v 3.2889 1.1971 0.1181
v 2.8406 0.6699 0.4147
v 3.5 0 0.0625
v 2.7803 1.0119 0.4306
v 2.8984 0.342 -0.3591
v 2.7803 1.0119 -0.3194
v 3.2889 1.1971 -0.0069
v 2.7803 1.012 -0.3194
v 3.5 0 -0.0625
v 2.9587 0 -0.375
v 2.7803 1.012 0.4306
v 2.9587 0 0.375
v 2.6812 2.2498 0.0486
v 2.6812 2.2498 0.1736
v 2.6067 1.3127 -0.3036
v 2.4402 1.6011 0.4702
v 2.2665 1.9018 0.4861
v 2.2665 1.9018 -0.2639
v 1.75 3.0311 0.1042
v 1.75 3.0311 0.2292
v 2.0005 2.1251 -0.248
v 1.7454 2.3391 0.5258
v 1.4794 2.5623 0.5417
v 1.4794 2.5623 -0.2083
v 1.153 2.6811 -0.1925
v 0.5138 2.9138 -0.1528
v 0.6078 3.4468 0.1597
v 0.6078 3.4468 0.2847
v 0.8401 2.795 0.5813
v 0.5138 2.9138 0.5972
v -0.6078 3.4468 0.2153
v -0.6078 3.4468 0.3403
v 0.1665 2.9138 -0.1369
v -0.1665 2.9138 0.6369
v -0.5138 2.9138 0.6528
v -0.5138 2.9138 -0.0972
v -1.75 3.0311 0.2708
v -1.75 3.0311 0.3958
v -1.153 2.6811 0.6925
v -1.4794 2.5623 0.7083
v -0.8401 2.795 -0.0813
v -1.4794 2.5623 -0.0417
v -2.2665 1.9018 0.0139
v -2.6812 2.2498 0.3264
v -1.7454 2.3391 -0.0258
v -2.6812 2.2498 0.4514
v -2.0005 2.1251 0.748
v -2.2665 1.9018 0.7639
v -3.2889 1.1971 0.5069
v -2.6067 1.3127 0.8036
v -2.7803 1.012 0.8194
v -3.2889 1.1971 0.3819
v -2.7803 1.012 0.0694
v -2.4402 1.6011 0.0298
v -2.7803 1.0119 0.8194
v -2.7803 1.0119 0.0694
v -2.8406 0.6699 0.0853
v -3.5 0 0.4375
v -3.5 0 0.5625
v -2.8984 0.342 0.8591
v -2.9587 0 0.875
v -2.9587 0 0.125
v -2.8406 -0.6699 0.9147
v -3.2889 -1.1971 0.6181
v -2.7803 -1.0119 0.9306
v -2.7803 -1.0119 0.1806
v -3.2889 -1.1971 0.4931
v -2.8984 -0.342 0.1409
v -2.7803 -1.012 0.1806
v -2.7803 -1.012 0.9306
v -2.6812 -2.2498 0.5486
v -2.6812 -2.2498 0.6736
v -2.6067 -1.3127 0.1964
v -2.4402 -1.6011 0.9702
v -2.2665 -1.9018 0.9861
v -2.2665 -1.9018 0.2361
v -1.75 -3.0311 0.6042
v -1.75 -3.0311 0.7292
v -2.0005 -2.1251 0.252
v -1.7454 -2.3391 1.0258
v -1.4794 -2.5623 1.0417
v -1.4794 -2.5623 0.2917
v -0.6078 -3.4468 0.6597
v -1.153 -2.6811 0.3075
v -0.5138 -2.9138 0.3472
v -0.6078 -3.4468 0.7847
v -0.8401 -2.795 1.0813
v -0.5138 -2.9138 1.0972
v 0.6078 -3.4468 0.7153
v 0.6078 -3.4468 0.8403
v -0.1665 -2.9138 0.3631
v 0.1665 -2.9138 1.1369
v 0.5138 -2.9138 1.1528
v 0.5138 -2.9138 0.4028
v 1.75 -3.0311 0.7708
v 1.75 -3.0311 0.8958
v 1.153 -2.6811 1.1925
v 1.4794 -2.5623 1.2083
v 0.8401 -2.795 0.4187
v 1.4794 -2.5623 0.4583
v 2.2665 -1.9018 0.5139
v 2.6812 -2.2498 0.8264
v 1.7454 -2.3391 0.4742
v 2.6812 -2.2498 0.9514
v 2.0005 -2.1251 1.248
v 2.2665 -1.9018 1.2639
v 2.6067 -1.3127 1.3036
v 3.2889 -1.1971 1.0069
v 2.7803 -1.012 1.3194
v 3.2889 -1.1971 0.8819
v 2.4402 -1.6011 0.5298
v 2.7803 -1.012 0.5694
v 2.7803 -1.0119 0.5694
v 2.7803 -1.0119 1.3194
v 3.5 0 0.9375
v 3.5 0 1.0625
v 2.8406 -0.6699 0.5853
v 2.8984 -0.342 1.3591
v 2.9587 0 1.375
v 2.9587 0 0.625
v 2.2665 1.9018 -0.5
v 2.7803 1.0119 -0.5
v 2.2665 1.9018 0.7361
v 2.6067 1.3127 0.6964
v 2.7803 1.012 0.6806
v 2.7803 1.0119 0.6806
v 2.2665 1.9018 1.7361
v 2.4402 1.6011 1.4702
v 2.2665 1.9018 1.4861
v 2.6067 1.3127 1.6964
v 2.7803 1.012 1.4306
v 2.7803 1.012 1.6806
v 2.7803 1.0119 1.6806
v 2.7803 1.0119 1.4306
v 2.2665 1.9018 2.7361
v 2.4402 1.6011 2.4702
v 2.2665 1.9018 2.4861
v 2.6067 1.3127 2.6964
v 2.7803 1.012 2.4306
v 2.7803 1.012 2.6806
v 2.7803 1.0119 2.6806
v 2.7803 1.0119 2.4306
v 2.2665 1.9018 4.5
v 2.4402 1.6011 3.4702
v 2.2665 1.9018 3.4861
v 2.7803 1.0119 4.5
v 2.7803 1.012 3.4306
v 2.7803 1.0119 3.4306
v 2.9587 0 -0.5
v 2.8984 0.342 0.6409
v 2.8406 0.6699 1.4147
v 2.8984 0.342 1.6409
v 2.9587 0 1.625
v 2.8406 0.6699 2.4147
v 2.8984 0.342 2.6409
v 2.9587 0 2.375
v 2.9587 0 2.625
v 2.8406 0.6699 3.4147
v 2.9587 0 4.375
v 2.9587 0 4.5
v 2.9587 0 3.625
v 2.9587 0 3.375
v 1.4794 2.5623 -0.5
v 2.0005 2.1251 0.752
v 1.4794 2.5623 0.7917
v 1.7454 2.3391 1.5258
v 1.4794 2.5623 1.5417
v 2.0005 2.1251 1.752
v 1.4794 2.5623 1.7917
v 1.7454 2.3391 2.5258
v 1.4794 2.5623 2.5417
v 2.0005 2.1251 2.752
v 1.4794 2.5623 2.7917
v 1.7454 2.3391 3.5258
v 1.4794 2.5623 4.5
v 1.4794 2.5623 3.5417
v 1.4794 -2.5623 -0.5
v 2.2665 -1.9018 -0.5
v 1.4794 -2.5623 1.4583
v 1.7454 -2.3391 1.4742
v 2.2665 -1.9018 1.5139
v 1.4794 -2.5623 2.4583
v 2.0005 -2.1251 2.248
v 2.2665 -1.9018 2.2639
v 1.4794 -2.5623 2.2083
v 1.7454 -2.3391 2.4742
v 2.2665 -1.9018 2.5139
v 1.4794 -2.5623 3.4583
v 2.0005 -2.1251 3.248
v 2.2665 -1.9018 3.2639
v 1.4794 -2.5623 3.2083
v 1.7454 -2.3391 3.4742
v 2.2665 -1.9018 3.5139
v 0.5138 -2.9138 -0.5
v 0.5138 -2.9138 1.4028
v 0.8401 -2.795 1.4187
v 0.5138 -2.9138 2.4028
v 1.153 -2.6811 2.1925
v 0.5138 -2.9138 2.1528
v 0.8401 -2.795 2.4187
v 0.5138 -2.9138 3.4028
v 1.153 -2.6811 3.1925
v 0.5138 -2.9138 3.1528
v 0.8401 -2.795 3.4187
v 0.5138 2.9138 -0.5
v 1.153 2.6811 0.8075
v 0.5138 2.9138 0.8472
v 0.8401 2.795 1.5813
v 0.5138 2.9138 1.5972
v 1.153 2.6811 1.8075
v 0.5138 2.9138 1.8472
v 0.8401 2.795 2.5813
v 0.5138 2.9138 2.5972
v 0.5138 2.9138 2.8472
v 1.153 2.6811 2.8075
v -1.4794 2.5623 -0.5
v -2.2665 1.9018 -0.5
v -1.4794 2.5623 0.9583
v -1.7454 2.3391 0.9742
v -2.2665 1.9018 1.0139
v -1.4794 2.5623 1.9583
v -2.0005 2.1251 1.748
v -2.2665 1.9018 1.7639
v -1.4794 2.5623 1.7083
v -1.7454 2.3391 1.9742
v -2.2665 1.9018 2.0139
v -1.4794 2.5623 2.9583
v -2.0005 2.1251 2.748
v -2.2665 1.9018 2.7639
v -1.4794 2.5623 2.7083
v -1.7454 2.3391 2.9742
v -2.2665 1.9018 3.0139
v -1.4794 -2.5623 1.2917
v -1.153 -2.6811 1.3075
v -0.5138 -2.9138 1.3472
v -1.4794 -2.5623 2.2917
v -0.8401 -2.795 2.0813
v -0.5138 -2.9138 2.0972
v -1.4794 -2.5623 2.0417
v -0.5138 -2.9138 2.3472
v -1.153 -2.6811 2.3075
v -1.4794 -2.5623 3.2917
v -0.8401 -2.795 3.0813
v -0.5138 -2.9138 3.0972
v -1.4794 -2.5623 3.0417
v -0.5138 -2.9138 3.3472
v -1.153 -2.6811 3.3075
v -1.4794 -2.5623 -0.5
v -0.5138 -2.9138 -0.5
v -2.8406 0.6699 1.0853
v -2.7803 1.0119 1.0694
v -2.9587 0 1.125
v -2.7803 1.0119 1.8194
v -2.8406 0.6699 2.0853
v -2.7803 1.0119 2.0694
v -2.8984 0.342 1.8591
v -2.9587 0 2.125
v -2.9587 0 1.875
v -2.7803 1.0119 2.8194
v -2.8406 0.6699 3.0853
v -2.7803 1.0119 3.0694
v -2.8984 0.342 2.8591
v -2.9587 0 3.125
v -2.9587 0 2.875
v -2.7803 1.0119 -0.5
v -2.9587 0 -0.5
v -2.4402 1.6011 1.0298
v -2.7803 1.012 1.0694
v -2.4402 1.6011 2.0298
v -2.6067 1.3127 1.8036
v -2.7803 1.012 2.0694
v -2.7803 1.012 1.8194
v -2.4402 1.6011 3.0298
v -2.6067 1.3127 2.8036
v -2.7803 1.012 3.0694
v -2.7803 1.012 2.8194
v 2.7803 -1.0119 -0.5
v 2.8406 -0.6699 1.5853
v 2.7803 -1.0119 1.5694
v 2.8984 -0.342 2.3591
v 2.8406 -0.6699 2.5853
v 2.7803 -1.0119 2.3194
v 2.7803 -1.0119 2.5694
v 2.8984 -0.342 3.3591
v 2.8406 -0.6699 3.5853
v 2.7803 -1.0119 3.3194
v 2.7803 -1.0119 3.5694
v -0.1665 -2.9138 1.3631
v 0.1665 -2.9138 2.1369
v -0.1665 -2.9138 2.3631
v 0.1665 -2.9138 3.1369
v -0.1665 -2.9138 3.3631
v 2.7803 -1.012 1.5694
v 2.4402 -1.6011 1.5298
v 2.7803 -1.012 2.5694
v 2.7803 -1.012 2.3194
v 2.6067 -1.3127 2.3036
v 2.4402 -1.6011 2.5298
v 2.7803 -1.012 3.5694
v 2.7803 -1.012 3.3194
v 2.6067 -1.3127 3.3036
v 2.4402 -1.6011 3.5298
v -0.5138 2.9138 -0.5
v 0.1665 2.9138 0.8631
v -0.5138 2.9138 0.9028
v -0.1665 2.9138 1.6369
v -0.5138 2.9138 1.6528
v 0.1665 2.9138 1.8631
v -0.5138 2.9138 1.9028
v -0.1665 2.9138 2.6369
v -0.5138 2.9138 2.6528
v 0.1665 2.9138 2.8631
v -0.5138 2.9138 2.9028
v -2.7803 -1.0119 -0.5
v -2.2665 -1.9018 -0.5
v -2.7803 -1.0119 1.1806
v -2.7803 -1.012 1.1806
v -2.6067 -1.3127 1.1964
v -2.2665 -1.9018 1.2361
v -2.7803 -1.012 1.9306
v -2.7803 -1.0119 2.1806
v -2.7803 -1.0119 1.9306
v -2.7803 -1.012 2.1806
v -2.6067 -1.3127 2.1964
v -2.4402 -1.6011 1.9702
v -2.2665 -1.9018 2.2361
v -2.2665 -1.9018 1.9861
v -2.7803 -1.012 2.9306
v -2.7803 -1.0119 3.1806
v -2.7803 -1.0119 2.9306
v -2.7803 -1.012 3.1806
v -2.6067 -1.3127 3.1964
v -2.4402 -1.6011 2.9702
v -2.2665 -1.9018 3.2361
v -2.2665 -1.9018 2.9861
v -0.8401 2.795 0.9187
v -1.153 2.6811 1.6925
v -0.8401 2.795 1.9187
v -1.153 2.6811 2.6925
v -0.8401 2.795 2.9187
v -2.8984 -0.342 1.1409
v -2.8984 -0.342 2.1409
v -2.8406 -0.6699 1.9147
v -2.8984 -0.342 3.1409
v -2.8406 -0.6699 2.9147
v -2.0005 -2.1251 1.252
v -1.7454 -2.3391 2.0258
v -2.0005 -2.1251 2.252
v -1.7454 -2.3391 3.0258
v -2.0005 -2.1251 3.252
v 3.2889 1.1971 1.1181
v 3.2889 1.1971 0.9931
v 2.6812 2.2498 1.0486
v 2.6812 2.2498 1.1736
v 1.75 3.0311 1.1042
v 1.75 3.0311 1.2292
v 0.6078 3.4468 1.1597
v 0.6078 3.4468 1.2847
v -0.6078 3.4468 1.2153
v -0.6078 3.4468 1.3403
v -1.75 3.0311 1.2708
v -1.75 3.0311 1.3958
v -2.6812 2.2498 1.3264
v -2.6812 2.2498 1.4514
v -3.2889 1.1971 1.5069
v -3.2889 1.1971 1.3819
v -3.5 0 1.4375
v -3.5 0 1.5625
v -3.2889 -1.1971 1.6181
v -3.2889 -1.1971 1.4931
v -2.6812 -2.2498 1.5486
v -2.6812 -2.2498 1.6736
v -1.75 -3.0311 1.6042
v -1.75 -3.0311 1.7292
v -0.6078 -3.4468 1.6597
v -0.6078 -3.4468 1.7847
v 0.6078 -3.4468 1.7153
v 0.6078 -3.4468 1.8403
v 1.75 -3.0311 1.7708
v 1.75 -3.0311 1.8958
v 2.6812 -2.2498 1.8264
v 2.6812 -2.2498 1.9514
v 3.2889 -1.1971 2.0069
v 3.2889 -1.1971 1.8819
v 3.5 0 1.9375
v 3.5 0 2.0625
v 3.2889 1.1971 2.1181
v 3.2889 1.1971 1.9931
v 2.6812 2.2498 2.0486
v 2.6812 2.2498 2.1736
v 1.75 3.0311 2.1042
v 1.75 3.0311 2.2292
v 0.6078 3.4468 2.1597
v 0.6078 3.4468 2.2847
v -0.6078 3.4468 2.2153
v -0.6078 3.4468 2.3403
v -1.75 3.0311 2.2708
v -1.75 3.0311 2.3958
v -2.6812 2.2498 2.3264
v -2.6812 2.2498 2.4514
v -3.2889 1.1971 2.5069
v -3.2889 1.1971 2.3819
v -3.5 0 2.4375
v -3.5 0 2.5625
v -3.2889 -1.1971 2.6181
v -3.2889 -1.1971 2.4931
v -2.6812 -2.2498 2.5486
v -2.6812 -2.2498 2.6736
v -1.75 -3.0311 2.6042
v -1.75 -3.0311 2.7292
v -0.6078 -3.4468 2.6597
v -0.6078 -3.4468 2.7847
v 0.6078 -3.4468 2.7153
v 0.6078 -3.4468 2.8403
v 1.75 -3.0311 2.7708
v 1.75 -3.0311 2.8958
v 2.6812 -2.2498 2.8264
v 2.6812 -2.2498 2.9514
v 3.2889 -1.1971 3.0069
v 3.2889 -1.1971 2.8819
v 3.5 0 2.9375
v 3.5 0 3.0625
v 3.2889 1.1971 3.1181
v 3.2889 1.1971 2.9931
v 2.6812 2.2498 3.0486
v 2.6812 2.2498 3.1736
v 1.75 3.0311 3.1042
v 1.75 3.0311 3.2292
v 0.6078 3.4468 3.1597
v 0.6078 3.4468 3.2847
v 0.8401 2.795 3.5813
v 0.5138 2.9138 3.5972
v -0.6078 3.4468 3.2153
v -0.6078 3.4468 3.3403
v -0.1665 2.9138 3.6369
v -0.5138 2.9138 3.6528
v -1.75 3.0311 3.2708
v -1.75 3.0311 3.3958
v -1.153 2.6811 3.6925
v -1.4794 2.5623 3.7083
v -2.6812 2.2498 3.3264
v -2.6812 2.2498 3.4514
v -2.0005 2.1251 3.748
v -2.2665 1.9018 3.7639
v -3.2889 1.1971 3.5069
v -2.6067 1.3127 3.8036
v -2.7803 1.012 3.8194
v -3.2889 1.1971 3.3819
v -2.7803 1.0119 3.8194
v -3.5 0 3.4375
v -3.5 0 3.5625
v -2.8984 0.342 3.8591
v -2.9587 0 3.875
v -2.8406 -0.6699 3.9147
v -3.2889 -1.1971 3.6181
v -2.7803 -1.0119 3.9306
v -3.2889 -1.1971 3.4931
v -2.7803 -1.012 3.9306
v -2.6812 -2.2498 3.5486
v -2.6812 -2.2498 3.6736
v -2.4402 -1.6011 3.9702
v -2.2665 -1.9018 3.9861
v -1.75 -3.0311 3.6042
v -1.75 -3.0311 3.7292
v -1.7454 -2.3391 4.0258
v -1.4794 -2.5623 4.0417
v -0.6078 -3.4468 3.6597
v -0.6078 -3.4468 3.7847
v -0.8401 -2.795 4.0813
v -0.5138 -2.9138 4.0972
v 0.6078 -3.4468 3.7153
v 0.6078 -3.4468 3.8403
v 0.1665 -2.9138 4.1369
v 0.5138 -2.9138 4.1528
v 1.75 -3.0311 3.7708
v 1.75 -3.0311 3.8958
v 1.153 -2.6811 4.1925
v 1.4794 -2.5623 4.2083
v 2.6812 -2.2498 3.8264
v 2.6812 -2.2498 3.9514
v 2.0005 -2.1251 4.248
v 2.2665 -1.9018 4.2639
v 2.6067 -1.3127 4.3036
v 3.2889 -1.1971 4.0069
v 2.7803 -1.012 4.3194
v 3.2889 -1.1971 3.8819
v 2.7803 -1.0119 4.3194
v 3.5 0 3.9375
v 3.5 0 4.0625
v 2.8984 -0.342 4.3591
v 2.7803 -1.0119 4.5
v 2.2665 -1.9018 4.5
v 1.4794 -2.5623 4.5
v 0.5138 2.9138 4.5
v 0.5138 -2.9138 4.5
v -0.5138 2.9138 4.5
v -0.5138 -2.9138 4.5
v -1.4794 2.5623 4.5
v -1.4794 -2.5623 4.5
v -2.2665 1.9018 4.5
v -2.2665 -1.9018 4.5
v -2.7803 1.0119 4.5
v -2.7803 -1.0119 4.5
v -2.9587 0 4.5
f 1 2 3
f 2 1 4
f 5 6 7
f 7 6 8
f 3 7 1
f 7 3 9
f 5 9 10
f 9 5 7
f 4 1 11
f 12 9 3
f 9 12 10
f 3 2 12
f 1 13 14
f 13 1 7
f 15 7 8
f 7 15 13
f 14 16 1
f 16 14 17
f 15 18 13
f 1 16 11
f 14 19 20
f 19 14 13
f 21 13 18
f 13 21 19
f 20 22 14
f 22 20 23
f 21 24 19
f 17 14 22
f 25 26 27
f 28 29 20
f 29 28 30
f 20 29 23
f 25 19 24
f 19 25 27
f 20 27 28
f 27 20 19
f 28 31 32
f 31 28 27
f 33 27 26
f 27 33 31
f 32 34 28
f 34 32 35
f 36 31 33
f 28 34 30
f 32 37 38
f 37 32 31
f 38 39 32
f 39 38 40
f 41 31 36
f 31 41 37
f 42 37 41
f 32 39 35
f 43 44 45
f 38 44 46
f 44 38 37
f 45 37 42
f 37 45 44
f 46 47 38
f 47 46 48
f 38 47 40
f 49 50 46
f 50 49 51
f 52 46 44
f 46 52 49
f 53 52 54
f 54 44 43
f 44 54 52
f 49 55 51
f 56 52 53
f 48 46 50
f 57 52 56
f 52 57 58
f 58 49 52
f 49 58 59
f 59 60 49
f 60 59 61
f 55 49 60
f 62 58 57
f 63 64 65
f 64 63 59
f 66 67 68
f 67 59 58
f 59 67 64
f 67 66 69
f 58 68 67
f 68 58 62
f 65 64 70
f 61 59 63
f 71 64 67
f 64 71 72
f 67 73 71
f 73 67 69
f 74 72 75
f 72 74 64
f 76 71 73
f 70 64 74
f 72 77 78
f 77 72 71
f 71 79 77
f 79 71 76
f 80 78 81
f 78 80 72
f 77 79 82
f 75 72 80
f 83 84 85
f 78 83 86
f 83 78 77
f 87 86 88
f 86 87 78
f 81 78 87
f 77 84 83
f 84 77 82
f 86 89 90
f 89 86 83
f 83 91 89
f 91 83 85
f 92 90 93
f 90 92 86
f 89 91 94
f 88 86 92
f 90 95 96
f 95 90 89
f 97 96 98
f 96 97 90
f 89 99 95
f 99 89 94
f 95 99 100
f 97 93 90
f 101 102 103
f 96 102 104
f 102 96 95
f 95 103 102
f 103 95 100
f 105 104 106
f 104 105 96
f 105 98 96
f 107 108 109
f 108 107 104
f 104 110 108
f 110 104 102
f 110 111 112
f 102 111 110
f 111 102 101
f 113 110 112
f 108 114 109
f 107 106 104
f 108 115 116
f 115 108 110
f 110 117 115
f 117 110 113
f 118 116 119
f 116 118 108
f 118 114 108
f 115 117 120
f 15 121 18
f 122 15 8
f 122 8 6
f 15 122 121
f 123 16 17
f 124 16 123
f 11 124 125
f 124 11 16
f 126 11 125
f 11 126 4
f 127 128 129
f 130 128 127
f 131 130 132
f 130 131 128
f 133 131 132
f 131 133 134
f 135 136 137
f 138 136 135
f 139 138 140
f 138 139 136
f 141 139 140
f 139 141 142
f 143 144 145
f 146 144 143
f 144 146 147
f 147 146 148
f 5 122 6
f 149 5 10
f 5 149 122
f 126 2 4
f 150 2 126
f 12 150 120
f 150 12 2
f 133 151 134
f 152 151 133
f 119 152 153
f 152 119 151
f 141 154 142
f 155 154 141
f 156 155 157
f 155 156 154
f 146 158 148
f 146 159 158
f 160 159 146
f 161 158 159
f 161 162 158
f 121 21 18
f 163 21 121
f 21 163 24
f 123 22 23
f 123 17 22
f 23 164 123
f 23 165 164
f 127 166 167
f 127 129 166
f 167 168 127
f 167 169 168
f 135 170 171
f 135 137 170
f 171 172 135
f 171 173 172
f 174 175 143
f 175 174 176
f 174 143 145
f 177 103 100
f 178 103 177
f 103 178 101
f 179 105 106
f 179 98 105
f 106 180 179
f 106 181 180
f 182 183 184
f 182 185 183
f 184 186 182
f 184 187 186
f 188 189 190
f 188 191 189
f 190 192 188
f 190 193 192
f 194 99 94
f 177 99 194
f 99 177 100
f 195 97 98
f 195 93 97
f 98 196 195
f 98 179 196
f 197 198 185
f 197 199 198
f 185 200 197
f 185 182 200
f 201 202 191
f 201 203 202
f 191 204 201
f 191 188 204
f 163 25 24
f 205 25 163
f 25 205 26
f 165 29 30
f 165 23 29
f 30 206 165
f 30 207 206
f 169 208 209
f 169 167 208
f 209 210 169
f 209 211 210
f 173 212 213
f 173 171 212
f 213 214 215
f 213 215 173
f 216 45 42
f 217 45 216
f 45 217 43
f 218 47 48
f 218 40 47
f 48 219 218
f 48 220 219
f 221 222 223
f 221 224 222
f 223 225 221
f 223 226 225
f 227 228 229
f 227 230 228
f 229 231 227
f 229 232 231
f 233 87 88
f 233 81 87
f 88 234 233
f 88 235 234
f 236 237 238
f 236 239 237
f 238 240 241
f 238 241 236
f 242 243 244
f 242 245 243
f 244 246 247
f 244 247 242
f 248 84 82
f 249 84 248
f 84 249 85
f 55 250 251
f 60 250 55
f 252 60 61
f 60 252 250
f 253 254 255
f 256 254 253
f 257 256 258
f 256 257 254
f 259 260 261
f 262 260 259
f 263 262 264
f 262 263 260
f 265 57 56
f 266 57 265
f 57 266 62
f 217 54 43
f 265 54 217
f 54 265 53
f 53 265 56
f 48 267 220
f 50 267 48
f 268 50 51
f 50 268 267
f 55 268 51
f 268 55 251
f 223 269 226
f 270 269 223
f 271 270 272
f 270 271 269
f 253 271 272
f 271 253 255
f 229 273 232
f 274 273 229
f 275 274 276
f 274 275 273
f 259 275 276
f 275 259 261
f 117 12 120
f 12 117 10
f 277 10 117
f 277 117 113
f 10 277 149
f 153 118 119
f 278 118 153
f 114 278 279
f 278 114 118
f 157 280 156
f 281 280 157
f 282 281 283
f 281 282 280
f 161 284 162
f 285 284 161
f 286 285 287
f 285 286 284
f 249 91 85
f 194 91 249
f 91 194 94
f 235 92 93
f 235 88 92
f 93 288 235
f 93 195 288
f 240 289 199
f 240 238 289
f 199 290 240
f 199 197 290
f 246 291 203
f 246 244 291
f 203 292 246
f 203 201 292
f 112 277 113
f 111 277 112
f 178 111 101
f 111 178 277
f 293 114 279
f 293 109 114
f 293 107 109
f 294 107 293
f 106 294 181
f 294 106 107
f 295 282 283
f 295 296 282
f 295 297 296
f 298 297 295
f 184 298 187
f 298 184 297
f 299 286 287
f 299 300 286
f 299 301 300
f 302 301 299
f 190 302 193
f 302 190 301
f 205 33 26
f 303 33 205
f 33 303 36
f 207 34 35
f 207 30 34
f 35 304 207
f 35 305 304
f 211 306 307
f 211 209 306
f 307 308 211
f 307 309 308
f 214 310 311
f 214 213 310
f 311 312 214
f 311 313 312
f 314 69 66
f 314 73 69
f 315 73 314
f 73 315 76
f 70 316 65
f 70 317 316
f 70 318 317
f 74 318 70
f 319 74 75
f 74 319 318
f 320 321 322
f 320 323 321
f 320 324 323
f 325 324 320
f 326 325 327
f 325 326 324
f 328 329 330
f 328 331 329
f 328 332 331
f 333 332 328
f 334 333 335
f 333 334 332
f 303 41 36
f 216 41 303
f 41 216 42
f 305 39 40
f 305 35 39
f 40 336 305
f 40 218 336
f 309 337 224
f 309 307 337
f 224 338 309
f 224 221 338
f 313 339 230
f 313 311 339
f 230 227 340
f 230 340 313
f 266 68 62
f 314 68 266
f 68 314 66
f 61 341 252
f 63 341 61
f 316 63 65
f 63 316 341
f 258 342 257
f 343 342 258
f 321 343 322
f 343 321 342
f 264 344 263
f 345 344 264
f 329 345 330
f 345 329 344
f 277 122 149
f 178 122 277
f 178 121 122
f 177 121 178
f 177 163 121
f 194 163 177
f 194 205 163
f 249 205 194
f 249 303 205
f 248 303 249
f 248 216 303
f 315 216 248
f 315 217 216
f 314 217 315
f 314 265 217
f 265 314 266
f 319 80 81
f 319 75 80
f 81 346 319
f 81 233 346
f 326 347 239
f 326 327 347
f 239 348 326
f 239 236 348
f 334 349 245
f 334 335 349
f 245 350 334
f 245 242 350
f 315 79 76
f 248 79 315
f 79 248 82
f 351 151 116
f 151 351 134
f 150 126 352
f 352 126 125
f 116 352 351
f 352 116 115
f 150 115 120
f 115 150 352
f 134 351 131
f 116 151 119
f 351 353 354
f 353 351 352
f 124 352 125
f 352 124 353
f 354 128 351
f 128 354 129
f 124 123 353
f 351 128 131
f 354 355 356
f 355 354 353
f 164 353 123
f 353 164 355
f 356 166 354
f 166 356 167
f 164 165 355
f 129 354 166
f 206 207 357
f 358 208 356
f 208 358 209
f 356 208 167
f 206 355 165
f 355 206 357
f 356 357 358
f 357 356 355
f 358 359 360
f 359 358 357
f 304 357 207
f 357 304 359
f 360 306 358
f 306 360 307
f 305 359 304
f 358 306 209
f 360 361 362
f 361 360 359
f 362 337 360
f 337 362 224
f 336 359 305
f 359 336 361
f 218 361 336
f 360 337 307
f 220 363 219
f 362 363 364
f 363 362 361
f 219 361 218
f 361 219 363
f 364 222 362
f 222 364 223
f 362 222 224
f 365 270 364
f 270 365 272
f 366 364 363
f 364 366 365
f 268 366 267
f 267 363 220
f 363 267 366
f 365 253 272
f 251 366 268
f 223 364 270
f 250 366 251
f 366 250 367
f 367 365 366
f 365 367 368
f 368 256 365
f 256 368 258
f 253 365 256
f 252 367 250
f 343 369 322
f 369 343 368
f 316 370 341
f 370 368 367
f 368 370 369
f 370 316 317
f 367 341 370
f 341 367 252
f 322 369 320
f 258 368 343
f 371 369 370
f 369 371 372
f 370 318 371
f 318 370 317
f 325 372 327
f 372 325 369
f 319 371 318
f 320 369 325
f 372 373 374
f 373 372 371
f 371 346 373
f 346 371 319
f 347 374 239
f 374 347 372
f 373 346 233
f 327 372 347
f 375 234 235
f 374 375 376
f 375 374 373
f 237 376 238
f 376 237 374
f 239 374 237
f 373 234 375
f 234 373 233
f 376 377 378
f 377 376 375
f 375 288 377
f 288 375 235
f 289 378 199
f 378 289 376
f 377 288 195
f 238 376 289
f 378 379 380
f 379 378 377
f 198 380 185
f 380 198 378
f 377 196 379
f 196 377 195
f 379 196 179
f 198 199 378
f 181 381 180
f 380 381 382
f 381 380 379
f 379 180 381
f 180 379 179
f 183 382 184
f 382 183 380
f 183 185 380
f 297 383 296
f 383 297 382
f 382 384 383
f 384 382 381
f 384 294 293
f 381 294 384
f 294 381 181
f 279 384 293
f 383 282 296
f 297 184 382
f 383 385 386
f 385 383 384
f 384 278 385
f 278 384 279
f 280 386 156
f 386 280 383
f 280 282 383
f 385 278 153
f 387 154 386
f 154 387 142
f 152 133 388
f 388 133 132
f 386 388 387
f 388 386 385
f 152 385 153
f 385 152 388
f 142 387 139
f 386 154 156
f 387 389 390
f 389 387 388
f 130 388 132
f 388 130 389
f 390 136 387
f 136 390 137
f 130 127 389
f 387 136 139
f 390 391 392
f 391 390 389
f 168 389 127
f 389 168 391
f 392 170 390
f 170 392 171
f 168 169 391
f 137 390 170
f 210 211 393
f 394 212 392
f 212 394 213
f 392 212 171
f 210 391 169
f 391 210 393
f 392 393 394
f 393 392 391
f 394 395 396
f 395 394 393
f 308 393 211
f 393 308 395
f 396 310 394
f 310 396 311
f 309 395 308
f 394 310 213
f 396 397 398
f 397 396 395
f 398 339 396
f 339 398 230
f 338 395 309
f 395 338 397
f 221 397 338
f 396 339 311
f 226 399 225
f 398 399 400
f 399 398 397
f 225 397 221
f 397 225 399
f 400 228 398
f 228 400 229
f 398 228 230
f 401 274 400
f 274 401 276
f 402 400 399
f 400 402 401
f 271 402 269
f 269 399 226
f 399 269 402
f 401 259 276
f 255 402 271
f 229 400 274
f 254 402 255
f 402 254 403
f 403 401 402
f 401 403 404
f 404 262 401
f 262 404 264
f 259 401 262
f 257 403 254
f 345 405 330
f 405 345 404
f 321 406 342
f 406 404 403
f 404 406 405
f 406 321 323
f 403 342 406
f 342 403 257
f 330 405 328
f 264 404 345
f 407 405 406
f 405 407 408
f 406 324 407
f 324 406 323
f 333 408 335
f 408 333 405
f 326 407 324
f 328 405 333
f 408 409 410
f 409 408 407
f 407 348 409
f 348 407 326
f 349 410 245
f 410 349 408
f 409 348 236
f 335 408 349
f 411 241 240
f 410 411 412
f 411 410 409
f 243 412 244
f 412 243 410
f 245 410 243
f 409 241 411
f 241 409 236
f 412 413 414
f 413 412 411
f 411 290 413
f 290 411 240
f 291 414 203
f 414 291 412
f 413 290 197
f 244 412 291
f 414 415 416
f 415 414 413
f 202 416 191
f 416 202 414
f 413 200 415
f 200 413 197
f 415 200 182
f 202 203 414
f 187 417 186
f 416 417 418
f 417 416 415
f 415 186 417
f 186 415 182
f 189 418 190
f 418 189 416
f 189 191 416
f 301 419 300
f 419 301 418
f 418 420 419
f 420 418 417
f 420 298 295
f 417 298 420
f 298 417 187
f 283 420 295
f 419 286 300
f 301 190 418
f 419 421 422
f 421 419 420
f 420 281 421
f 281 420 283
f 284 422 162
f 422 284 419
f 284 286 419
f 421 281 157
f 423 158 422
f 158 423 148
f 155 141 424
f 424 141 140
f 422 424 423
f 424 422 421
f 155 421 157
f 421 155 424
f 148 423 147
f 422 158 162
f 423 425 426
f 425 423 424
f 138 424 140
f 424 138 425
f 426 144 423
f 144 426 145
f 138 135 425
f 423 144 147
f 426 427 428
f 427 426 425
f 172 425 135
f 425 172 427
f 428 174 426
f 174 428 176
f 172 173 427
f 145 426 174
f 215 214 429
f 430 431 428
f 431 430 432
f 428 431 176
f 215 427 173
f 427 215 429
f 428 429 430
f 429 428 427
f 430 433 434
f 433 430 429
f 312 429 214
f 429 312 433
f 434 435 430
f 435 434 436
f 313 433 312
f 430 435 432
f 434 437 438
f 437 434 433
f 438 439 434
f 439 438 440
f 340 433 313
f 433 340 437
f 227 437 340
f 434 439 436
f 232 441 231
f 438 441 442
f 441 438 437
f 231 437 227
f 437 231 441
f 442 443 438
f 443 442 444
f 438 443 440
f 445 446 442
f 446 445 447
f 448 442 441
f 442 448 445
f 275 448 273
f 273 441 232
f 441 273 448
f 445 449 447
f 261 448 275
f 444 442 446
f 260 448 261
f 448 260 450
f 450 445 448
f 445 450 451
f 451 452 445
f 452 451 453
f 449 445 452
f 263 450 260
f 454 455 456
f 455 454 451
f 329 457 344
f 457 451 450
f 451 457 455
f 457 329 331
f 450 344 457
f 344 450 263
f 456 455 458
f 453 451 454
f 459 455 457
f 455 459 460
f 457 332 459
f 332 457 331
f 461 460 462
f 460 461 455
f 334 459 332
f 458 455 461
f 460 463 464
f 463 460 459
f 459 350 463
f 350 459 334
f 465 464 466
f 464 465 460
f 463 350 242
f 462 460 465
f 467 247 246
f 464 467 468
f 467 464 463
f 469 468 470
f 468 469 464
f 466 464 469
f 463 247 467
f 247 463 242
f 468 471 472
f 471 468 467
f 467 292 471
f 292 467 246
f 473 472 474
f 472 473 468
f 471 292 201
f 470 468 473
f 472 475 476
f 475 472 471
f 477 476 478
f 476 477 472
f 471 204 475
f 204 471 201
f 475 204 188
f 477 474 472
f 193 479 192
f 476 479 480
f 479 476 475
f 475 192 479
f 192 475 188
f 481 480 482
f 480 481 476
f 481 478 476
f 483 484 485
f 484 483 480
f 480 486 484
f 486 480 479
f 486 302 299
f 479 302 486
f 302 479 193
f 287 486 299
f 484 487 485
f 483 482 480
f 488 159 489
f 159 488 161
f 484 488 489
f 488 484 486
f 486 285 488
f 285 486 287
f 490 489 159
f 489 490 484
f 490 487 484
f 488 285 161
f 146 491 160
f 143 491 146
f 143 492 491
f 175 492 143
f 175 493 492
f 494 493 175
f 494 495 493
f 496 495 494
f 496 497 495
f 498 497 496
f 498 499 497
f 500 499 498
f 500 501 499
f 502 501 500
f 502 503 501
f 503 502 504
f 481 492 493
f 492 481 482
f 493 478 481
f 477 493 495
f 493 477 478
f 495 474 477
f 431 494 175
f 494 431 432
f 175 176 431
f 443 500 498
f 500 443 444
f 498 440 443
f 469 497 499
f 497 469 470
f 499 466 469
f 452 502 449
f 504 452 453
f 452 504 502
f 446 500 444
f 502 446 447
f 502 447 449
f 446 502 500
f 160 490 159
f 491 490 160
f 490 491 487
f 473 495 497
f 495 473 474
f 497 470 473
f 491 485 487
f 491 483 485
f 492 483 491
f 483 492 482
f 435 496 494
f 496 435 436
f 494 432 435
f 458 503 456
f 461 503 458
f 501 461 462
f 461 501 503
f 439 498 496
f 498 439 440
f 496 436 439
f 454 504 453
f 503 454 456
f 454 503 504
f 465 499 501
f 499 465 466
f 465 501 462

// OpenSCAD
// Metric Screw Thread Library
// by Maximilian Karl <karlma@in.tum.de> (2014)
// 
//
// only use module thread(P,D,h,step)
// with the parameters:
// P    - screw thread pitch
// D    - screw thread major diameter
// h    - screw thread height
// step - step size in degree
// 

module screwthread_triangle(P) {
	difference() {
		translate([-sqrt(3)/3*P+sqrt(3)/2*P/8,0,0])
		rotate([90,0,0])
		cylinder(r=sqrt(3)/3*P,h=0.00001,$fn=3,center=true);

		translate([0,-P/2,-P/2])
		cube([P,P,P]);
	}
}

module screwthread_onerotation(P,D_maj,step) {
	H = sqrt(3)/2*P;
	D_min = D_maj - 5*sqrt(3)/8*P;

	for(i=[0:step:360-step])
	hull()
		for(j = [0,step])
		rotate([0,0,(i+j)])
		translate([D_maj/2,0,(i+j)/360*P])
		screwthread_triangle(P);

	translate([0,0,P/2])
	cylinder(r=D_min/2,h=2*P,$fn=360/step,center=true);
}

module thread(P,D,step,rotations) {
    // added parameter "rotations"
    // as proposed by user bluecamel
	for(i=[0:rotations])
	translate([0,0,i*P])
	screwthread_onerotation(P,D,step);
}


// example
thread(1,7,20,3);
